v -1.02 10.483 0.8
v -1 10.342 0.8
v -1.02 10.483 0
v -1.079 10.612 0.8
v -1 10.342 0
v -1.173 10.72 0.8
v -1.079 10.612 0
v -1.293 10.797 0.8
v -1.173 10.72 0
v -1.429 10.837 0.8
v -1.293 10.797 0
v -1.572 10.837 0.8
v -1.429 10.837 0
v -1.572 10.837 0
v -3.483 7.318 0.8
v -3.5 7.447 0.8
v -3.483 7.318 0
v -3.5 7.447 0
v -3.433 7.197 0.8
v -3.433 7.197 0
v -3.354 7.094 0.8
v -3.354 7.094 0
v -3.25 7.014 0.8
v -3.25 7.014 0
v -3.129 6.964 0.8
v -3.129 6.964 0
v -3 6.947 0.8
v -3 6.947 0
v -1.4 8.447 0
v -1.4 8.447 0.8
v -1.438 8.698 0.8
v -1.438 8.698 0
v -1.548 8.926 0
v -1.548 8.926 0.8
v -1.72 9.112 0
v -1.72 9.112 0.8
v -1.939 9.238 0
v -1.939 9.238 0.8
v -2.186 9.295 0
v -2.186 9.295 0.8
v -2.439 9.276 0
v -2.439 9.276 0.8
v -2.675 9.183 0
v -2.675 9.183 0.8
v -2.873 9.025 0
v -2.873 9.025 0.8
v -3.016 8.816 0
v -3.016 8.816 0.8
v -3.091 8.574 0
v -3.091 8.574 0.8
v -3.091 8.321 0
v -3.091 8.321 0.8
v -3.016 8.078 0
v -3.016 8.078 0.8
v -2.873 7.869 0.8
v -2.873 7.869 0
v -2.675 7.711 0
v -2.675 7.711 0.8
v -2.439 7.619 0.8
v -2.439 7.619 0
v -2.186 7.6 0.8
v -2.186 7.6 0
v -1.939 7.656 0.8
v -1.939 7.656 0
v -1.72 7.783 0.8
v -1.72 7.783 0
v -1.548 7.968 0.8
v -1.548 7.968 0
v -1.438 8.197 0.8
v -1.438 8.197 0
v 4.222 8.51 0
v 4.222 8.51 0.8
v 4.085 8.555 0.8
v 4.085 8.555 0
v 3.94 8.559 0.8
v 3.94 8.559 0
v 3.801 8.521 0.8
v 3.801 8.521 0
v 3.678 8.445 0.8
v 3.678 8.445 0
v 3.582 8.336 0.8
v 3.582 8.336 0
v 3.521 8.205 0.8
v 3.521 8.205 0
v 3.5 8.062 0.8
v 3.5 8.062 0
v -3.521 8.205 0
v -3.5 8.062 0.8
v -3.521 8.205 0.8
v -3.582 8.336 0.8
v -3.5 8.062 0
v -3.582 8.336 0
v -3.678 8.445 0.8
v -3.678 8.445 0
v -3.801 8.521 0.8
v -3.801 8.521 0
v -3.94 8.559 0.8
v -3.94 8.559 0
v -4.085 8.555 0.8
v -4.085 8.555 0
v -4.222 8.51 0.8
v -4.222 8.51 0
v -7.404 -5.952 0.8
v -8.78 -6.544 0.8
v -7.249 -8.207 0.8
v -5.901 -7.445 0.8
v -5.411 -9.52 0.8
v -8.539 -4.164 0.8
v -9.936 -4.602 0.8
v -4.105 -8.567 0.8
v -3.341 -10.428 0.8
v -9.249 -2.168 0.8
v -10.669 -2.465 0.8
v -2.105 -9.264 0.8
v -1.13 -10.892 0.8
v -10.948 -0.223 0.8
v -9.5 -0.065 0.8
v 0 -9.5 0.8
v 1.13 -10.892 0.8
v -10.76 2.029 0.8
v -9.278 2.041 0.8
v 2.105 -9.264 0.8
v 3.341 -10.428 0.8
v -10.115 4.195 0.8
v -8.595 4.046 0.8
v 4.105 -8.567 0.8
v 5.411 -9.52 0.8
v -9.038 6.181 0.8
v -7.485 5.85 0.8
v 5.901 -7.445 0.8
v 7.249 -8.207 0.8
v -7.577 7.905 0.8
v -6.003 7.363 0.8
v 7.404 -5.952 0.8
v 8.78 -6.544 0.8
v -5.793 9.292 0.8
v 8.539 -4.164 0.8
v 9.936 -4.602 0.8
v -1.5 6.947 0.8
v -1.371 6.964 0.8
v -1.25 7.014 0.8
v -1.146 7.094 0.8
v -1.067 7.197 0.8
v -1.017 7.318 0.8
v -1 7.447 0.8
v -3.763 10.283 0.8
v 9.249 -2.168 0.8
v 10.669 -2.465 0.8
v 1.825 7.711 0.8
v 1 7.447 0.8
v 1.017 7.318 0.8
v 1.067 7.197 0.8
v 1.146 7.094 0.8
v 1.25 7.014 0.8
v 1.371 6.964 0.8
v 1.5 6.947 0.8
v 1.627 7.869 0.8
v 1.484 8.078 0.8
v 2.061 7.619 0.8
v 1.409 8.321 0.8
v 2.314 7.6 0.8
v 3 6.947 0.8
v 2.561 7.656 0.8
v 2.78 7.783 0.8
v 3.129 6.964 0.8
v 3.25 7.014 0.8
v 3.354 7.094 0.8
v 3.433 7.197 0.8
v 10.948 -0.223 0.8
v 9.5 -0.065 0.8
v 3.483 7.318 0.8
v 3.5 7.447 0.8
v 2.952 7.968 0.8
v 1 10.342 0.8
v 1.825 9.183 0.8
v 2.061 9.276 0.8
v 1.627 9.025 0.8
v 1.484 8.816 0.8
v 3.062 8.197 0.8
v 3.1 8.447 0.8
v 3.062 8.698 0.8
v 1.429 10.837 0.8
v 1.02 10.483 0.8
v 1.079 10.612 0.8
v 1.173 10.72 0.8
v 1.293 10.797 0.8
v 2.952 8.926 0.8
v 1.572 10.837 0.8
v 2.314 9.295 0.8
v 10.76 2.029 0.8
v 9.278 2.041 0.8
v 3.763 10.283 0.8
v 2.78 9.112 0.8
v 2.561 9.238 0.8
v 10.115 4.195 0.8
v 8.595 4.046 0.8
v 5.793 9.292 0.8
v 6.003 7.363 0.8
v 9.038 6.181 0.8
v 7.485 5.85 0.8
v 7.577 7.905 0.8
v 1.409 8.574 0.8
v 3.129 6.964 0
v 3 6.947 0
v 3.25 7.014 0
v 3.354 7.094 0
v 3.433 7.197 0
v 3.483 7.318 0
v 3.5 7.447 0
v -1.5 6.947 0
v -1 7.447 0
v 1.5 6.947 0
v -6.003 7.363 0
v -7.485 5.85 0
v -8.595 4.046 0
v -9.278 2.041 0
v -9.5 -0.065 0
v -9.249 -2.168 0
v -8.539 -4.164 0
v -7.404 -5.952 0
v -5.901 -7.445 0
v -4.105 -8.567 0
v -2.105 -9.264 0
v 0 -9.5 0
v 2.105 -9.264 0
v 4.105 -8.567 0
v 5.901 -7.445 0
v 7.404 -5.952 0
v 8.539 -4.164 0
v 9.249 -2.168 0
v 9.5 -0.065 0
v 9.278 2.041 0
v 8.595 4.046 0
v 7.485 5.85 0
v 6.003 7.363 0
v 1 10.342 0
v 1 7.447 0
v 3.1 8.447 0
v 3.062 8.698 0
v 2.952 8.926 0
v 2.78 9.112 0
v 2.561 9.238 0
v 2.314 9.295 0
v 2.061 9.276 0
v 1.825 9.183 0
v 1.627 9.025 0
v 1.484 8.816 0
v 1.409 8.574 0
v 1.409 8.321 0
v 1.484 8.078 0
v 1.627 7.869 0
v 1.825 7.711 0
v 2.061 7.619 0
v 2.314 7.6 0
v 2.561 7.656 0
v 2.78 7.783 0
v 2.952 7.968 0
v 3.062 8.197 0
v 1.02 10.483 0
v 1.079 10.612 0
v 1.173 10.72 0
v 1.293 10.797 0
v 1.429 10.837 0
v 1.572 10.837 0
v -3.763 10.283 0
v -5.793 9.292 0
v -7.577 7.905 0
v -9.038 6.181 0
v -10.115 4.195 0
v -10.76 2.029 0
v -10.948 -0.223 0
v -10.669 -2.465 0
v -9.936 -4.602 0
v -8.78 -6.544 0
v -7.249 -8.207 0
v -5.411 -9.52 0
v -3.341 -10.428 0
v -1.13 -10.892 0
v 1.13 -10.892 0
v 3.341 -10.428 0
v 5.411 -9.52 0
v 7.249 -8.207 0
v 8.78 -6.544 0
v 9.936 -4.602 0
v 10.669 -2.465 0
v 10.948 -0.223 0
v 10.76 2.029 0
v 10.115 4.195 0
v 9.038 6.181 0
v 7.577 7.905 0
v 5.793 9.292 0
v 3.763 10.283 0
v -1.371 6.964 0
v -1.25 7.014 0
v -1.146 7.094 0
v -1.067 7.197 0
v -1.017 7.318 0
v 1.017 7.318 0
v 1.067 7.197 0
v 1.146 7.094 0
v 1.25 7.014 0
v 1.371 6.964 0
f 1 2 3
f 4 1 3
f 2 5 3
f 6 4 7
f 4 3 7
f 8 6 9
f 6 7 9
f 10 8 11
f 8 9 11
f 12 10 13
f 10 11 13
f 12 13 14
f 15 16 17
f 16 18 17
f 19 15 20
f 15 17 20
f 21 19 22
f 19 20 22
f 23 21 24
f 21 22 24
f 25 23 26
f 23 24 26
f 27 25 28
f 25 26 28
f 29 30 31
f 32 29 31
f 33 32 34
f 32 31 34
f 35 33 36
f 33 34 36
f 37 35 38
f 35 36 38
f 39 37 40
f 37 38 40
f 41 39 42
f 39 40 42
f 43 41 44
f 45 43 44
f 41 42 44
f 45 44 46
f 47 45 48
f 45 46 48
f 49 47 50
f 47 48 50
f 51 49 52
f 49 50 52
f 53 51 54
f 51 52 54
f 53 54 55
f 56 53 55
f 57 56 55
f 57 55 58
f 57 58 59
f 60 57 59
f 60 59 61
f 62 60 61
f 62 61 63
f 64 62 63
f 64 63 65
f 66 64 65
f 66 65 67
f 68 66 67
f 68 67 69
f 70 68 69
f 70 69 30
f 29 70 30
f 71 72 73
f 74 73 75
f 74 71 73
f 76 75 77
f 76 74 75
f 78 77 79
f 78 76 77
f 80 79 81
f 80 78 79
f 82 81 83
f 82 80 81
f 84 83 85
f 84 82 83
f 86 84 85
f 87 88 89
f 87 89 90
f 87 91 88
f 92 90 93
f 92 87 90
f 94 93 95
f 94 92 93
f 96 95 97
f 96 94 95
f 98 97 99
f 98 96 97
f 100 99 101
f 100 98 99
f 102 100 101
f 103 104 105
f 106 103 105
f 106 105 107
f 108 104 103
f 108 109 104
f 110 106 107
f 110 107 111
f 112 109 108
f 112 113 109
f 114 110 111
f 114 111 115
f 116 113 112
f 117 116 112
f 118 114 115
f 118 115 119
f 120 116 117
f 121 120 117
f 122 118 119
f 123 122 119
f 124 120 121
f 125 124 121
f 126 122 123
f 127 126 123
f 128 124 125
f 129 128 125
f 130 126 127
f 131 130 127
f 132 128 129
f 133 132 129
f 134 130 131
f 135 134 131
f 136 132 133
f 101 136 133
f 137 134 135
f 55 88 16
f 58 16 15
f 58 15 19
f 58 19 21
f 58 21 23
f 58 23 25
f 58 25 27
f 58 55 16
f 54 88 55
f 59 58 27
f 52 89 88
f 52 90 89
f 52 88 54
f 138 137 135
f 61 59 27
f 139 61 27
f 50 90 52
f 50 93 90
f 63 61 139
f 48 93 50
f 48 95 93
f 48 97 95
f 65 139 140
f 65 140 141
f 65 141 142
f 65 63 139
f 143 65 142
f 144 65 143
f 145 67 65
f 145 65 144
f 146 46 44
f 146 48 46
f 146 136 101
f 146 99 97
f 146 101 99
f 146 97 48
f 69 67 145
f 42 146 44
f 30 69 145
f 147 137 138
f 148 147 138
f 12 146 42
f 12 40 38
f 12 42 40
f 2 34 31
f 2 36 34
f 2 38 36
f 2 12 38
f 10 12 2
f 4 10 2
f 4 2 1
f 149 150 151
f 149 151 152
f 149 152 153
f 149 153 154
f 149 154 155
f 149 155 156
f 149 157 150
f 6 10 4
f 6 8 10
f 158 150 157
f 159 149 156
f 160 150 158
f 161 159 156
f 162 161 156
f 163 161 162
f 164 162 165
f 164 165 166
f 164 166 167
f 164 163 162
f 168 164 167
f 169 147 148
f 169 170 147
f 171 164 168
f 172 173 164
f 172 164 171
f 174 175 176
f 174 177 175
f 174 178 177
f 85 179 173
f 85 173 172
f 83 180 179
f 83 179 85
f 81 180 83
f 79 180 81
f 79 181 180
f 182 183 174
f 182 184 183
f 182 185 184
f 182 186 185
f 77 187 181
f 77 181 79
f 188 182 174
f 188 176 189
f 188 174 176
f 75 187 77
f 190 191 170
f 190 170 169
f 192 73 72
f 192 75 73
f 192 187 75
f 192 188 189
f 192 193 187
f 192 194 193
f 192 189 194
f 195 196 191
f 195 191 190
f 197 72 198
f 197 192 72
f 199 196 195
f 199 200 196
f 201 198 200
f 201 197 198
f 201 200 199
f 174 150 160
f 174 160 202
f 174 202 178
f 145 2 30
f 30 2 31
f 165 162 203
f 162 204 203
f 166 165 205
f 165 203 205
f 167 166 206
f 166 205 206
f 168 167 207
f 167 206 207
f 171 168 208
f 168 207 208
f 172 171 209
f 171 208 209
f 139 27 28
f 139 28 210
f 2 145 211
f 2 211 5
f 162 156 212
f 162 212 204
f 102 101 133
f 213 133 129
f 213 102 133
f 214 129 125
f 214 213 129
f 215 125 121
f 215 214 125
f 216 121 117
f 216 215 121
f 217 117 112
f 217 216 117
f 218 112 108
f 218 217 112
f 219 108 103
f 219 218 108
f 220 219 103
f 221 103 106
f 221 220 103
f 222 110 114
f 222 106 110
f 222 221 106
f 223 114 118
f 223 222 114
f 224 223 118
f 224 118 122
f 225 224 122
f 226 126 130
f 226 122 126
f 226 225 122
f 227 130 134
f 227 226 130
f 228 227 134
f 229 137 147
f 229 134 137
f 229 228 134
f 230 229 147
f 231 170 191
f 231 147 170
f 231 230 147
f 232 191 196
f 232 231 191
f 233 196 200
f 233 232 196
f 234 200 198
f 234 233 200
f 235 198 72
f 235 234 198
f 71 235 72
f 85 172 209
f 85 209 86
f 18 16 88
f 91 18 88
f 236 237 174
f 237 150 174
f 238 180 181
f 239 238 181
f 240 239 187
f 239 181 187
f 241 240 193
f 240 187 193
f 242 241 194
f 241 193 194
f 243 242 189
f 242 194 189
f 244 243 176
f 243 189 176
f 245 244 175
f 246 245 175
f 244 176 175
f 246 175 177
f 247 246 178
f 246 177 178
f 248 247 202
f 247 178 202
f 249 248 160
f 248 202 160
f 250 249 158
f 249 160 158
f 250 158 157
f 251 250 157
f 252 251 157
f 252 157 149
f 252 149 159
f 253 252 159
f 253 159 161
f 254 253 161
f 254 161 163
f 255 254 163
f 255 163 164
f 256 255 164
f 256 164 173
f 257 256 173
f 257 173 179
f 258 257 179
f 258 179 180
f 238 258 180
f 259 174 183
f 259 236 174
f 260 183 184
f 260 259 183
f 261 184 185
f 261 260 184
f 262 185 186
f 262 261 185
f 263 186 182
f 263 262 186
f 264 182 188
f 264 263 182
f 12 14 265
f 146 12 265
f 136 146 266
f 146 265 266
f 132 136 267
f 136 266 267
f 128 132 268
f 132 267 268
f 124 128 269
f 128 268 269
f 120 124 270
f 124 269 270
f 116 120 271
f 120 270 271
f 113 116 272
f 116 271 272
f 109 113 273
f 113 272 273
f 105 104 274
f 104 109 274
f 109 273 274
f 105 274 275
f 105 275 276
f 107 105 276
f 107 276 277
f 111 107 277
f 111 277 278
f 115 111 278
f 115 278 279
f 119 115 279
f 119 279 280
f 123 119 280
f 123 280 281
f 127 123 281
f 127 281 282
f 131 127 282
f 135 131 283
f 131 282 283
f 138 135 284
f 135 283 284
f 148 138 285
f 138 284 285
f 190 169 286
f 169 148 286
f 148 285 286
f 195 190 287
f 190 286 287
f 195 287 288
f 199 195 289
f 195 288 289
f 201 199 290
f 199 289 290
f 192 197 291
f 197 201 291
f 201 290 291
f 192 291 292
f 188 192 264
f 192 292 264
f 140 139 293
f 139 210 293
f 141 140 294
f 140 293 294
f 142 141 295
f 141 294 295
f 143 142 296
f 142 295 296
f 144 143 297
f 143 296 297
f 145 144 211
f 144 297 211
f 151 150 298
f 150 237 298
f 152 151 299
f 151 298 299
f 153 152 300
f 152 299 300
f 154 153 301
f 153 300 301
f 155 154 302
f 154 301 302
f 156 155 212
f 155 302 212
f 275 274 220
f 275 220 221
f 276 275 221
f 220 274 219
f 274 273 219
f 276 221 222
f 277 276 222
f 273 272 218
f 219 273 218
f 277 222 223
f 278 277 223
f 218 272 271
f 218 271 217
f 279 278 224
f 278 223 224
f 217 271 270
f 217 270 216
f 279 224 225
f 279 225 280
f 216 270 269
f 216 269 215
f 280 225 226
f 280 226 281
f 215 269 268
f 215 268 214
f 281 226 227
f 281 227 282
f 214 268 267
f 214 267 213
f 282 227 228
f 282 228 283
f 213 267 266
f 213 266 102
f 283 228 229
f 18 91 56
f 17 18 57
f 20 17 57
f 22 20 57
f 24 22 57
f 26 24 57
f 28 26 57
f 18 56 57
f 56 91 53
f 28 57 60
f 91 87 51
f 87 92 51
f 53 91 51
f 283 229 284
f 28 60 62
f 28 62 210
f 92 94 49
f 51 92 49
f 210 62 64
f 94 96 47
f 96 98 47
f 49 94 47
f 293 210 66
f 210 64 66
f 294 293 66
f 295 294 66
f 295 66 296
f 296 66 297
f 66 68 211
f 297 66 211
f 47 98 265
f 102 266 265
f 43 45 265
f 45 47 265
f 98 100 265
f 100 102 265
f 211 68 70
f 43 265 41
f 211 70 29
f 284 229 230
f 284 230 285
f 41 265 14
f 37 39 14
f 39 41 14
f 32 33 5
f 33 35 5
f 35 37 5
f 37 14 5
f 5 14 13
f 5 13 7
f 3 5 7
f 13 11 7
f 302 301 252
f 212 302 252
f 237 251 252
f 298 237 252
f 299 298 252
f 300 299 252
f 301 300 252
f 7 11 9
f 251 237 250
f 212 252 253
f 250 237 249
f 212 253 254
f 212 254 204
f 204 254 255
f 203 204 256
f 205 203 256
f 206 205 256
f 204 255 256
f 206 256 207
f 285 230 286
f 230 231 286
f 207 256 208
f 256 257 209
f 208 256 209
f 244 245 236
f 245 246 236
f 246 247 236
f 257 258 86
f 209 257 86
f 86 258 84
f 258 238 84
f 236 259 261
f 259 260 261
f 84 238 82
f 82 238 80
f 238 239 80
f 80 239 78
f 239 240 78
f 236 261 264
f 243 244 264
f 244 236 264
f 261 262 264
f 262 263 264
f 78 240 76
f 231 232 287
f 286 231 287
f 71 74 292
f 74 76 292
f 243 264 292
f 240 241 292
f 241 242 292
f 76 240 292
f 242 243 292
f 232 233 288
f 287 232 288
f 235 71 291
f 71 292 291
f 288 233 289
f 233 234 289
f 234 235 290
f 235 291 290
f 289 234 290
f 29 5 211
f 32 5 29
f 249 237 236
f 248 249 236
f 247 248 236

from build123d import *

# Parameters (mm, degrees)
SKETCH1_R           = 10.95
SKETCH1_R_2         = 9.5
BOSS_EXTRUDE1_DEPTH = 0.8
SKETCH2_W           = 2
SKETCH2_H           = 14.789010462
CUT_EXTRUDE1_DEPTH  = 16.506289047
SKETCH3_W           = 2.5
SKETCH3_H           = 2.5
BOSS_EXTRUDE2_DEPTH = 0.8
FILLET1_R           = 0.5
FILLET2_R           = 0.5
SKETCH4_R           = 0.85
CUT_EXTRUDE2_DEPTH  = 16.506289047


with BuildPart() as part:
    # Sketch1 → Boss-Extrude1 (new body)
    with BuildSketch(Plane.XY):
        Circle(SKETCH1_R)
        Circle(SKETCH1_R_2, mode=Mode.SUBTRACT)
    extrude(amount=BOSS_EXTRUDE1_DEPTH)

    # Sketch2 → Cut-Extrude1 (cut, through all)
    with BuildSketch(Plane.XY.offset(0.8)):
        with Locations((0, 7.394505231)):
            Rectangle(SKETCH2_W, SKETCH2_H)
    extrude(amount=-CUT_EXTRUDE1_DEPTH, mode=Mode.SUBTRACT)

    # Sketch3 → Boss-Extrude2 (add)
    with BuildSketch(Plane.XY.offset(0.8)):
        with Locations((2.25, 8.197221814)):
            Rectangle(SKETCH3_W, SKETCH3_H)
        with Locations((-2.25, 8.197221814)):
            Rectangle(SKETCH3_W, SKETCH3_H)
    extrude(amount=-BOSS_EXTRUDE2_DEPTH)

    # Fillet1
    fillet1_edges = [part.edges().sort_by_distance(p)[0] for p in [
        (1, 10.904242294, 0.4),
        (-1, 10.904242294, 0.4),
        (3.5, 8.831760866, 0.4),
        (-3.5, 8.831760866, 0.4),
    ]]
    fillet(fillet1_edges, radius=FILLET1_R)

    # Fillet2
    fillet2_edges = [part.edges().sort_by_distance(p)[0] for p in [
        (1, 6.947221814, 0.4),
        (3.5, 6.947221814, 0.4),
        (-1, 6.947221814, 0.4),
        (-3.5, 6.947221814, 0.4),
    ]]
    fillet(fillet2_edges, radius=FILLET2_R)

    # Sketch4 → Cut-Extrude2 (cut, through all)
    with BuildSketch(Plane.XY.offset(0.8)):
        with Locations((2.25, 8.447221814)):
            Circle(SKETCH4_R)
        with Locations((-2.25, 8.447221814)):
            Circle(SKETCH4_R)
    extrude(amount=-CUT_EXTRUDE2_DEPTH, mode=Mode.SUBTRACT)


solid = part.part
